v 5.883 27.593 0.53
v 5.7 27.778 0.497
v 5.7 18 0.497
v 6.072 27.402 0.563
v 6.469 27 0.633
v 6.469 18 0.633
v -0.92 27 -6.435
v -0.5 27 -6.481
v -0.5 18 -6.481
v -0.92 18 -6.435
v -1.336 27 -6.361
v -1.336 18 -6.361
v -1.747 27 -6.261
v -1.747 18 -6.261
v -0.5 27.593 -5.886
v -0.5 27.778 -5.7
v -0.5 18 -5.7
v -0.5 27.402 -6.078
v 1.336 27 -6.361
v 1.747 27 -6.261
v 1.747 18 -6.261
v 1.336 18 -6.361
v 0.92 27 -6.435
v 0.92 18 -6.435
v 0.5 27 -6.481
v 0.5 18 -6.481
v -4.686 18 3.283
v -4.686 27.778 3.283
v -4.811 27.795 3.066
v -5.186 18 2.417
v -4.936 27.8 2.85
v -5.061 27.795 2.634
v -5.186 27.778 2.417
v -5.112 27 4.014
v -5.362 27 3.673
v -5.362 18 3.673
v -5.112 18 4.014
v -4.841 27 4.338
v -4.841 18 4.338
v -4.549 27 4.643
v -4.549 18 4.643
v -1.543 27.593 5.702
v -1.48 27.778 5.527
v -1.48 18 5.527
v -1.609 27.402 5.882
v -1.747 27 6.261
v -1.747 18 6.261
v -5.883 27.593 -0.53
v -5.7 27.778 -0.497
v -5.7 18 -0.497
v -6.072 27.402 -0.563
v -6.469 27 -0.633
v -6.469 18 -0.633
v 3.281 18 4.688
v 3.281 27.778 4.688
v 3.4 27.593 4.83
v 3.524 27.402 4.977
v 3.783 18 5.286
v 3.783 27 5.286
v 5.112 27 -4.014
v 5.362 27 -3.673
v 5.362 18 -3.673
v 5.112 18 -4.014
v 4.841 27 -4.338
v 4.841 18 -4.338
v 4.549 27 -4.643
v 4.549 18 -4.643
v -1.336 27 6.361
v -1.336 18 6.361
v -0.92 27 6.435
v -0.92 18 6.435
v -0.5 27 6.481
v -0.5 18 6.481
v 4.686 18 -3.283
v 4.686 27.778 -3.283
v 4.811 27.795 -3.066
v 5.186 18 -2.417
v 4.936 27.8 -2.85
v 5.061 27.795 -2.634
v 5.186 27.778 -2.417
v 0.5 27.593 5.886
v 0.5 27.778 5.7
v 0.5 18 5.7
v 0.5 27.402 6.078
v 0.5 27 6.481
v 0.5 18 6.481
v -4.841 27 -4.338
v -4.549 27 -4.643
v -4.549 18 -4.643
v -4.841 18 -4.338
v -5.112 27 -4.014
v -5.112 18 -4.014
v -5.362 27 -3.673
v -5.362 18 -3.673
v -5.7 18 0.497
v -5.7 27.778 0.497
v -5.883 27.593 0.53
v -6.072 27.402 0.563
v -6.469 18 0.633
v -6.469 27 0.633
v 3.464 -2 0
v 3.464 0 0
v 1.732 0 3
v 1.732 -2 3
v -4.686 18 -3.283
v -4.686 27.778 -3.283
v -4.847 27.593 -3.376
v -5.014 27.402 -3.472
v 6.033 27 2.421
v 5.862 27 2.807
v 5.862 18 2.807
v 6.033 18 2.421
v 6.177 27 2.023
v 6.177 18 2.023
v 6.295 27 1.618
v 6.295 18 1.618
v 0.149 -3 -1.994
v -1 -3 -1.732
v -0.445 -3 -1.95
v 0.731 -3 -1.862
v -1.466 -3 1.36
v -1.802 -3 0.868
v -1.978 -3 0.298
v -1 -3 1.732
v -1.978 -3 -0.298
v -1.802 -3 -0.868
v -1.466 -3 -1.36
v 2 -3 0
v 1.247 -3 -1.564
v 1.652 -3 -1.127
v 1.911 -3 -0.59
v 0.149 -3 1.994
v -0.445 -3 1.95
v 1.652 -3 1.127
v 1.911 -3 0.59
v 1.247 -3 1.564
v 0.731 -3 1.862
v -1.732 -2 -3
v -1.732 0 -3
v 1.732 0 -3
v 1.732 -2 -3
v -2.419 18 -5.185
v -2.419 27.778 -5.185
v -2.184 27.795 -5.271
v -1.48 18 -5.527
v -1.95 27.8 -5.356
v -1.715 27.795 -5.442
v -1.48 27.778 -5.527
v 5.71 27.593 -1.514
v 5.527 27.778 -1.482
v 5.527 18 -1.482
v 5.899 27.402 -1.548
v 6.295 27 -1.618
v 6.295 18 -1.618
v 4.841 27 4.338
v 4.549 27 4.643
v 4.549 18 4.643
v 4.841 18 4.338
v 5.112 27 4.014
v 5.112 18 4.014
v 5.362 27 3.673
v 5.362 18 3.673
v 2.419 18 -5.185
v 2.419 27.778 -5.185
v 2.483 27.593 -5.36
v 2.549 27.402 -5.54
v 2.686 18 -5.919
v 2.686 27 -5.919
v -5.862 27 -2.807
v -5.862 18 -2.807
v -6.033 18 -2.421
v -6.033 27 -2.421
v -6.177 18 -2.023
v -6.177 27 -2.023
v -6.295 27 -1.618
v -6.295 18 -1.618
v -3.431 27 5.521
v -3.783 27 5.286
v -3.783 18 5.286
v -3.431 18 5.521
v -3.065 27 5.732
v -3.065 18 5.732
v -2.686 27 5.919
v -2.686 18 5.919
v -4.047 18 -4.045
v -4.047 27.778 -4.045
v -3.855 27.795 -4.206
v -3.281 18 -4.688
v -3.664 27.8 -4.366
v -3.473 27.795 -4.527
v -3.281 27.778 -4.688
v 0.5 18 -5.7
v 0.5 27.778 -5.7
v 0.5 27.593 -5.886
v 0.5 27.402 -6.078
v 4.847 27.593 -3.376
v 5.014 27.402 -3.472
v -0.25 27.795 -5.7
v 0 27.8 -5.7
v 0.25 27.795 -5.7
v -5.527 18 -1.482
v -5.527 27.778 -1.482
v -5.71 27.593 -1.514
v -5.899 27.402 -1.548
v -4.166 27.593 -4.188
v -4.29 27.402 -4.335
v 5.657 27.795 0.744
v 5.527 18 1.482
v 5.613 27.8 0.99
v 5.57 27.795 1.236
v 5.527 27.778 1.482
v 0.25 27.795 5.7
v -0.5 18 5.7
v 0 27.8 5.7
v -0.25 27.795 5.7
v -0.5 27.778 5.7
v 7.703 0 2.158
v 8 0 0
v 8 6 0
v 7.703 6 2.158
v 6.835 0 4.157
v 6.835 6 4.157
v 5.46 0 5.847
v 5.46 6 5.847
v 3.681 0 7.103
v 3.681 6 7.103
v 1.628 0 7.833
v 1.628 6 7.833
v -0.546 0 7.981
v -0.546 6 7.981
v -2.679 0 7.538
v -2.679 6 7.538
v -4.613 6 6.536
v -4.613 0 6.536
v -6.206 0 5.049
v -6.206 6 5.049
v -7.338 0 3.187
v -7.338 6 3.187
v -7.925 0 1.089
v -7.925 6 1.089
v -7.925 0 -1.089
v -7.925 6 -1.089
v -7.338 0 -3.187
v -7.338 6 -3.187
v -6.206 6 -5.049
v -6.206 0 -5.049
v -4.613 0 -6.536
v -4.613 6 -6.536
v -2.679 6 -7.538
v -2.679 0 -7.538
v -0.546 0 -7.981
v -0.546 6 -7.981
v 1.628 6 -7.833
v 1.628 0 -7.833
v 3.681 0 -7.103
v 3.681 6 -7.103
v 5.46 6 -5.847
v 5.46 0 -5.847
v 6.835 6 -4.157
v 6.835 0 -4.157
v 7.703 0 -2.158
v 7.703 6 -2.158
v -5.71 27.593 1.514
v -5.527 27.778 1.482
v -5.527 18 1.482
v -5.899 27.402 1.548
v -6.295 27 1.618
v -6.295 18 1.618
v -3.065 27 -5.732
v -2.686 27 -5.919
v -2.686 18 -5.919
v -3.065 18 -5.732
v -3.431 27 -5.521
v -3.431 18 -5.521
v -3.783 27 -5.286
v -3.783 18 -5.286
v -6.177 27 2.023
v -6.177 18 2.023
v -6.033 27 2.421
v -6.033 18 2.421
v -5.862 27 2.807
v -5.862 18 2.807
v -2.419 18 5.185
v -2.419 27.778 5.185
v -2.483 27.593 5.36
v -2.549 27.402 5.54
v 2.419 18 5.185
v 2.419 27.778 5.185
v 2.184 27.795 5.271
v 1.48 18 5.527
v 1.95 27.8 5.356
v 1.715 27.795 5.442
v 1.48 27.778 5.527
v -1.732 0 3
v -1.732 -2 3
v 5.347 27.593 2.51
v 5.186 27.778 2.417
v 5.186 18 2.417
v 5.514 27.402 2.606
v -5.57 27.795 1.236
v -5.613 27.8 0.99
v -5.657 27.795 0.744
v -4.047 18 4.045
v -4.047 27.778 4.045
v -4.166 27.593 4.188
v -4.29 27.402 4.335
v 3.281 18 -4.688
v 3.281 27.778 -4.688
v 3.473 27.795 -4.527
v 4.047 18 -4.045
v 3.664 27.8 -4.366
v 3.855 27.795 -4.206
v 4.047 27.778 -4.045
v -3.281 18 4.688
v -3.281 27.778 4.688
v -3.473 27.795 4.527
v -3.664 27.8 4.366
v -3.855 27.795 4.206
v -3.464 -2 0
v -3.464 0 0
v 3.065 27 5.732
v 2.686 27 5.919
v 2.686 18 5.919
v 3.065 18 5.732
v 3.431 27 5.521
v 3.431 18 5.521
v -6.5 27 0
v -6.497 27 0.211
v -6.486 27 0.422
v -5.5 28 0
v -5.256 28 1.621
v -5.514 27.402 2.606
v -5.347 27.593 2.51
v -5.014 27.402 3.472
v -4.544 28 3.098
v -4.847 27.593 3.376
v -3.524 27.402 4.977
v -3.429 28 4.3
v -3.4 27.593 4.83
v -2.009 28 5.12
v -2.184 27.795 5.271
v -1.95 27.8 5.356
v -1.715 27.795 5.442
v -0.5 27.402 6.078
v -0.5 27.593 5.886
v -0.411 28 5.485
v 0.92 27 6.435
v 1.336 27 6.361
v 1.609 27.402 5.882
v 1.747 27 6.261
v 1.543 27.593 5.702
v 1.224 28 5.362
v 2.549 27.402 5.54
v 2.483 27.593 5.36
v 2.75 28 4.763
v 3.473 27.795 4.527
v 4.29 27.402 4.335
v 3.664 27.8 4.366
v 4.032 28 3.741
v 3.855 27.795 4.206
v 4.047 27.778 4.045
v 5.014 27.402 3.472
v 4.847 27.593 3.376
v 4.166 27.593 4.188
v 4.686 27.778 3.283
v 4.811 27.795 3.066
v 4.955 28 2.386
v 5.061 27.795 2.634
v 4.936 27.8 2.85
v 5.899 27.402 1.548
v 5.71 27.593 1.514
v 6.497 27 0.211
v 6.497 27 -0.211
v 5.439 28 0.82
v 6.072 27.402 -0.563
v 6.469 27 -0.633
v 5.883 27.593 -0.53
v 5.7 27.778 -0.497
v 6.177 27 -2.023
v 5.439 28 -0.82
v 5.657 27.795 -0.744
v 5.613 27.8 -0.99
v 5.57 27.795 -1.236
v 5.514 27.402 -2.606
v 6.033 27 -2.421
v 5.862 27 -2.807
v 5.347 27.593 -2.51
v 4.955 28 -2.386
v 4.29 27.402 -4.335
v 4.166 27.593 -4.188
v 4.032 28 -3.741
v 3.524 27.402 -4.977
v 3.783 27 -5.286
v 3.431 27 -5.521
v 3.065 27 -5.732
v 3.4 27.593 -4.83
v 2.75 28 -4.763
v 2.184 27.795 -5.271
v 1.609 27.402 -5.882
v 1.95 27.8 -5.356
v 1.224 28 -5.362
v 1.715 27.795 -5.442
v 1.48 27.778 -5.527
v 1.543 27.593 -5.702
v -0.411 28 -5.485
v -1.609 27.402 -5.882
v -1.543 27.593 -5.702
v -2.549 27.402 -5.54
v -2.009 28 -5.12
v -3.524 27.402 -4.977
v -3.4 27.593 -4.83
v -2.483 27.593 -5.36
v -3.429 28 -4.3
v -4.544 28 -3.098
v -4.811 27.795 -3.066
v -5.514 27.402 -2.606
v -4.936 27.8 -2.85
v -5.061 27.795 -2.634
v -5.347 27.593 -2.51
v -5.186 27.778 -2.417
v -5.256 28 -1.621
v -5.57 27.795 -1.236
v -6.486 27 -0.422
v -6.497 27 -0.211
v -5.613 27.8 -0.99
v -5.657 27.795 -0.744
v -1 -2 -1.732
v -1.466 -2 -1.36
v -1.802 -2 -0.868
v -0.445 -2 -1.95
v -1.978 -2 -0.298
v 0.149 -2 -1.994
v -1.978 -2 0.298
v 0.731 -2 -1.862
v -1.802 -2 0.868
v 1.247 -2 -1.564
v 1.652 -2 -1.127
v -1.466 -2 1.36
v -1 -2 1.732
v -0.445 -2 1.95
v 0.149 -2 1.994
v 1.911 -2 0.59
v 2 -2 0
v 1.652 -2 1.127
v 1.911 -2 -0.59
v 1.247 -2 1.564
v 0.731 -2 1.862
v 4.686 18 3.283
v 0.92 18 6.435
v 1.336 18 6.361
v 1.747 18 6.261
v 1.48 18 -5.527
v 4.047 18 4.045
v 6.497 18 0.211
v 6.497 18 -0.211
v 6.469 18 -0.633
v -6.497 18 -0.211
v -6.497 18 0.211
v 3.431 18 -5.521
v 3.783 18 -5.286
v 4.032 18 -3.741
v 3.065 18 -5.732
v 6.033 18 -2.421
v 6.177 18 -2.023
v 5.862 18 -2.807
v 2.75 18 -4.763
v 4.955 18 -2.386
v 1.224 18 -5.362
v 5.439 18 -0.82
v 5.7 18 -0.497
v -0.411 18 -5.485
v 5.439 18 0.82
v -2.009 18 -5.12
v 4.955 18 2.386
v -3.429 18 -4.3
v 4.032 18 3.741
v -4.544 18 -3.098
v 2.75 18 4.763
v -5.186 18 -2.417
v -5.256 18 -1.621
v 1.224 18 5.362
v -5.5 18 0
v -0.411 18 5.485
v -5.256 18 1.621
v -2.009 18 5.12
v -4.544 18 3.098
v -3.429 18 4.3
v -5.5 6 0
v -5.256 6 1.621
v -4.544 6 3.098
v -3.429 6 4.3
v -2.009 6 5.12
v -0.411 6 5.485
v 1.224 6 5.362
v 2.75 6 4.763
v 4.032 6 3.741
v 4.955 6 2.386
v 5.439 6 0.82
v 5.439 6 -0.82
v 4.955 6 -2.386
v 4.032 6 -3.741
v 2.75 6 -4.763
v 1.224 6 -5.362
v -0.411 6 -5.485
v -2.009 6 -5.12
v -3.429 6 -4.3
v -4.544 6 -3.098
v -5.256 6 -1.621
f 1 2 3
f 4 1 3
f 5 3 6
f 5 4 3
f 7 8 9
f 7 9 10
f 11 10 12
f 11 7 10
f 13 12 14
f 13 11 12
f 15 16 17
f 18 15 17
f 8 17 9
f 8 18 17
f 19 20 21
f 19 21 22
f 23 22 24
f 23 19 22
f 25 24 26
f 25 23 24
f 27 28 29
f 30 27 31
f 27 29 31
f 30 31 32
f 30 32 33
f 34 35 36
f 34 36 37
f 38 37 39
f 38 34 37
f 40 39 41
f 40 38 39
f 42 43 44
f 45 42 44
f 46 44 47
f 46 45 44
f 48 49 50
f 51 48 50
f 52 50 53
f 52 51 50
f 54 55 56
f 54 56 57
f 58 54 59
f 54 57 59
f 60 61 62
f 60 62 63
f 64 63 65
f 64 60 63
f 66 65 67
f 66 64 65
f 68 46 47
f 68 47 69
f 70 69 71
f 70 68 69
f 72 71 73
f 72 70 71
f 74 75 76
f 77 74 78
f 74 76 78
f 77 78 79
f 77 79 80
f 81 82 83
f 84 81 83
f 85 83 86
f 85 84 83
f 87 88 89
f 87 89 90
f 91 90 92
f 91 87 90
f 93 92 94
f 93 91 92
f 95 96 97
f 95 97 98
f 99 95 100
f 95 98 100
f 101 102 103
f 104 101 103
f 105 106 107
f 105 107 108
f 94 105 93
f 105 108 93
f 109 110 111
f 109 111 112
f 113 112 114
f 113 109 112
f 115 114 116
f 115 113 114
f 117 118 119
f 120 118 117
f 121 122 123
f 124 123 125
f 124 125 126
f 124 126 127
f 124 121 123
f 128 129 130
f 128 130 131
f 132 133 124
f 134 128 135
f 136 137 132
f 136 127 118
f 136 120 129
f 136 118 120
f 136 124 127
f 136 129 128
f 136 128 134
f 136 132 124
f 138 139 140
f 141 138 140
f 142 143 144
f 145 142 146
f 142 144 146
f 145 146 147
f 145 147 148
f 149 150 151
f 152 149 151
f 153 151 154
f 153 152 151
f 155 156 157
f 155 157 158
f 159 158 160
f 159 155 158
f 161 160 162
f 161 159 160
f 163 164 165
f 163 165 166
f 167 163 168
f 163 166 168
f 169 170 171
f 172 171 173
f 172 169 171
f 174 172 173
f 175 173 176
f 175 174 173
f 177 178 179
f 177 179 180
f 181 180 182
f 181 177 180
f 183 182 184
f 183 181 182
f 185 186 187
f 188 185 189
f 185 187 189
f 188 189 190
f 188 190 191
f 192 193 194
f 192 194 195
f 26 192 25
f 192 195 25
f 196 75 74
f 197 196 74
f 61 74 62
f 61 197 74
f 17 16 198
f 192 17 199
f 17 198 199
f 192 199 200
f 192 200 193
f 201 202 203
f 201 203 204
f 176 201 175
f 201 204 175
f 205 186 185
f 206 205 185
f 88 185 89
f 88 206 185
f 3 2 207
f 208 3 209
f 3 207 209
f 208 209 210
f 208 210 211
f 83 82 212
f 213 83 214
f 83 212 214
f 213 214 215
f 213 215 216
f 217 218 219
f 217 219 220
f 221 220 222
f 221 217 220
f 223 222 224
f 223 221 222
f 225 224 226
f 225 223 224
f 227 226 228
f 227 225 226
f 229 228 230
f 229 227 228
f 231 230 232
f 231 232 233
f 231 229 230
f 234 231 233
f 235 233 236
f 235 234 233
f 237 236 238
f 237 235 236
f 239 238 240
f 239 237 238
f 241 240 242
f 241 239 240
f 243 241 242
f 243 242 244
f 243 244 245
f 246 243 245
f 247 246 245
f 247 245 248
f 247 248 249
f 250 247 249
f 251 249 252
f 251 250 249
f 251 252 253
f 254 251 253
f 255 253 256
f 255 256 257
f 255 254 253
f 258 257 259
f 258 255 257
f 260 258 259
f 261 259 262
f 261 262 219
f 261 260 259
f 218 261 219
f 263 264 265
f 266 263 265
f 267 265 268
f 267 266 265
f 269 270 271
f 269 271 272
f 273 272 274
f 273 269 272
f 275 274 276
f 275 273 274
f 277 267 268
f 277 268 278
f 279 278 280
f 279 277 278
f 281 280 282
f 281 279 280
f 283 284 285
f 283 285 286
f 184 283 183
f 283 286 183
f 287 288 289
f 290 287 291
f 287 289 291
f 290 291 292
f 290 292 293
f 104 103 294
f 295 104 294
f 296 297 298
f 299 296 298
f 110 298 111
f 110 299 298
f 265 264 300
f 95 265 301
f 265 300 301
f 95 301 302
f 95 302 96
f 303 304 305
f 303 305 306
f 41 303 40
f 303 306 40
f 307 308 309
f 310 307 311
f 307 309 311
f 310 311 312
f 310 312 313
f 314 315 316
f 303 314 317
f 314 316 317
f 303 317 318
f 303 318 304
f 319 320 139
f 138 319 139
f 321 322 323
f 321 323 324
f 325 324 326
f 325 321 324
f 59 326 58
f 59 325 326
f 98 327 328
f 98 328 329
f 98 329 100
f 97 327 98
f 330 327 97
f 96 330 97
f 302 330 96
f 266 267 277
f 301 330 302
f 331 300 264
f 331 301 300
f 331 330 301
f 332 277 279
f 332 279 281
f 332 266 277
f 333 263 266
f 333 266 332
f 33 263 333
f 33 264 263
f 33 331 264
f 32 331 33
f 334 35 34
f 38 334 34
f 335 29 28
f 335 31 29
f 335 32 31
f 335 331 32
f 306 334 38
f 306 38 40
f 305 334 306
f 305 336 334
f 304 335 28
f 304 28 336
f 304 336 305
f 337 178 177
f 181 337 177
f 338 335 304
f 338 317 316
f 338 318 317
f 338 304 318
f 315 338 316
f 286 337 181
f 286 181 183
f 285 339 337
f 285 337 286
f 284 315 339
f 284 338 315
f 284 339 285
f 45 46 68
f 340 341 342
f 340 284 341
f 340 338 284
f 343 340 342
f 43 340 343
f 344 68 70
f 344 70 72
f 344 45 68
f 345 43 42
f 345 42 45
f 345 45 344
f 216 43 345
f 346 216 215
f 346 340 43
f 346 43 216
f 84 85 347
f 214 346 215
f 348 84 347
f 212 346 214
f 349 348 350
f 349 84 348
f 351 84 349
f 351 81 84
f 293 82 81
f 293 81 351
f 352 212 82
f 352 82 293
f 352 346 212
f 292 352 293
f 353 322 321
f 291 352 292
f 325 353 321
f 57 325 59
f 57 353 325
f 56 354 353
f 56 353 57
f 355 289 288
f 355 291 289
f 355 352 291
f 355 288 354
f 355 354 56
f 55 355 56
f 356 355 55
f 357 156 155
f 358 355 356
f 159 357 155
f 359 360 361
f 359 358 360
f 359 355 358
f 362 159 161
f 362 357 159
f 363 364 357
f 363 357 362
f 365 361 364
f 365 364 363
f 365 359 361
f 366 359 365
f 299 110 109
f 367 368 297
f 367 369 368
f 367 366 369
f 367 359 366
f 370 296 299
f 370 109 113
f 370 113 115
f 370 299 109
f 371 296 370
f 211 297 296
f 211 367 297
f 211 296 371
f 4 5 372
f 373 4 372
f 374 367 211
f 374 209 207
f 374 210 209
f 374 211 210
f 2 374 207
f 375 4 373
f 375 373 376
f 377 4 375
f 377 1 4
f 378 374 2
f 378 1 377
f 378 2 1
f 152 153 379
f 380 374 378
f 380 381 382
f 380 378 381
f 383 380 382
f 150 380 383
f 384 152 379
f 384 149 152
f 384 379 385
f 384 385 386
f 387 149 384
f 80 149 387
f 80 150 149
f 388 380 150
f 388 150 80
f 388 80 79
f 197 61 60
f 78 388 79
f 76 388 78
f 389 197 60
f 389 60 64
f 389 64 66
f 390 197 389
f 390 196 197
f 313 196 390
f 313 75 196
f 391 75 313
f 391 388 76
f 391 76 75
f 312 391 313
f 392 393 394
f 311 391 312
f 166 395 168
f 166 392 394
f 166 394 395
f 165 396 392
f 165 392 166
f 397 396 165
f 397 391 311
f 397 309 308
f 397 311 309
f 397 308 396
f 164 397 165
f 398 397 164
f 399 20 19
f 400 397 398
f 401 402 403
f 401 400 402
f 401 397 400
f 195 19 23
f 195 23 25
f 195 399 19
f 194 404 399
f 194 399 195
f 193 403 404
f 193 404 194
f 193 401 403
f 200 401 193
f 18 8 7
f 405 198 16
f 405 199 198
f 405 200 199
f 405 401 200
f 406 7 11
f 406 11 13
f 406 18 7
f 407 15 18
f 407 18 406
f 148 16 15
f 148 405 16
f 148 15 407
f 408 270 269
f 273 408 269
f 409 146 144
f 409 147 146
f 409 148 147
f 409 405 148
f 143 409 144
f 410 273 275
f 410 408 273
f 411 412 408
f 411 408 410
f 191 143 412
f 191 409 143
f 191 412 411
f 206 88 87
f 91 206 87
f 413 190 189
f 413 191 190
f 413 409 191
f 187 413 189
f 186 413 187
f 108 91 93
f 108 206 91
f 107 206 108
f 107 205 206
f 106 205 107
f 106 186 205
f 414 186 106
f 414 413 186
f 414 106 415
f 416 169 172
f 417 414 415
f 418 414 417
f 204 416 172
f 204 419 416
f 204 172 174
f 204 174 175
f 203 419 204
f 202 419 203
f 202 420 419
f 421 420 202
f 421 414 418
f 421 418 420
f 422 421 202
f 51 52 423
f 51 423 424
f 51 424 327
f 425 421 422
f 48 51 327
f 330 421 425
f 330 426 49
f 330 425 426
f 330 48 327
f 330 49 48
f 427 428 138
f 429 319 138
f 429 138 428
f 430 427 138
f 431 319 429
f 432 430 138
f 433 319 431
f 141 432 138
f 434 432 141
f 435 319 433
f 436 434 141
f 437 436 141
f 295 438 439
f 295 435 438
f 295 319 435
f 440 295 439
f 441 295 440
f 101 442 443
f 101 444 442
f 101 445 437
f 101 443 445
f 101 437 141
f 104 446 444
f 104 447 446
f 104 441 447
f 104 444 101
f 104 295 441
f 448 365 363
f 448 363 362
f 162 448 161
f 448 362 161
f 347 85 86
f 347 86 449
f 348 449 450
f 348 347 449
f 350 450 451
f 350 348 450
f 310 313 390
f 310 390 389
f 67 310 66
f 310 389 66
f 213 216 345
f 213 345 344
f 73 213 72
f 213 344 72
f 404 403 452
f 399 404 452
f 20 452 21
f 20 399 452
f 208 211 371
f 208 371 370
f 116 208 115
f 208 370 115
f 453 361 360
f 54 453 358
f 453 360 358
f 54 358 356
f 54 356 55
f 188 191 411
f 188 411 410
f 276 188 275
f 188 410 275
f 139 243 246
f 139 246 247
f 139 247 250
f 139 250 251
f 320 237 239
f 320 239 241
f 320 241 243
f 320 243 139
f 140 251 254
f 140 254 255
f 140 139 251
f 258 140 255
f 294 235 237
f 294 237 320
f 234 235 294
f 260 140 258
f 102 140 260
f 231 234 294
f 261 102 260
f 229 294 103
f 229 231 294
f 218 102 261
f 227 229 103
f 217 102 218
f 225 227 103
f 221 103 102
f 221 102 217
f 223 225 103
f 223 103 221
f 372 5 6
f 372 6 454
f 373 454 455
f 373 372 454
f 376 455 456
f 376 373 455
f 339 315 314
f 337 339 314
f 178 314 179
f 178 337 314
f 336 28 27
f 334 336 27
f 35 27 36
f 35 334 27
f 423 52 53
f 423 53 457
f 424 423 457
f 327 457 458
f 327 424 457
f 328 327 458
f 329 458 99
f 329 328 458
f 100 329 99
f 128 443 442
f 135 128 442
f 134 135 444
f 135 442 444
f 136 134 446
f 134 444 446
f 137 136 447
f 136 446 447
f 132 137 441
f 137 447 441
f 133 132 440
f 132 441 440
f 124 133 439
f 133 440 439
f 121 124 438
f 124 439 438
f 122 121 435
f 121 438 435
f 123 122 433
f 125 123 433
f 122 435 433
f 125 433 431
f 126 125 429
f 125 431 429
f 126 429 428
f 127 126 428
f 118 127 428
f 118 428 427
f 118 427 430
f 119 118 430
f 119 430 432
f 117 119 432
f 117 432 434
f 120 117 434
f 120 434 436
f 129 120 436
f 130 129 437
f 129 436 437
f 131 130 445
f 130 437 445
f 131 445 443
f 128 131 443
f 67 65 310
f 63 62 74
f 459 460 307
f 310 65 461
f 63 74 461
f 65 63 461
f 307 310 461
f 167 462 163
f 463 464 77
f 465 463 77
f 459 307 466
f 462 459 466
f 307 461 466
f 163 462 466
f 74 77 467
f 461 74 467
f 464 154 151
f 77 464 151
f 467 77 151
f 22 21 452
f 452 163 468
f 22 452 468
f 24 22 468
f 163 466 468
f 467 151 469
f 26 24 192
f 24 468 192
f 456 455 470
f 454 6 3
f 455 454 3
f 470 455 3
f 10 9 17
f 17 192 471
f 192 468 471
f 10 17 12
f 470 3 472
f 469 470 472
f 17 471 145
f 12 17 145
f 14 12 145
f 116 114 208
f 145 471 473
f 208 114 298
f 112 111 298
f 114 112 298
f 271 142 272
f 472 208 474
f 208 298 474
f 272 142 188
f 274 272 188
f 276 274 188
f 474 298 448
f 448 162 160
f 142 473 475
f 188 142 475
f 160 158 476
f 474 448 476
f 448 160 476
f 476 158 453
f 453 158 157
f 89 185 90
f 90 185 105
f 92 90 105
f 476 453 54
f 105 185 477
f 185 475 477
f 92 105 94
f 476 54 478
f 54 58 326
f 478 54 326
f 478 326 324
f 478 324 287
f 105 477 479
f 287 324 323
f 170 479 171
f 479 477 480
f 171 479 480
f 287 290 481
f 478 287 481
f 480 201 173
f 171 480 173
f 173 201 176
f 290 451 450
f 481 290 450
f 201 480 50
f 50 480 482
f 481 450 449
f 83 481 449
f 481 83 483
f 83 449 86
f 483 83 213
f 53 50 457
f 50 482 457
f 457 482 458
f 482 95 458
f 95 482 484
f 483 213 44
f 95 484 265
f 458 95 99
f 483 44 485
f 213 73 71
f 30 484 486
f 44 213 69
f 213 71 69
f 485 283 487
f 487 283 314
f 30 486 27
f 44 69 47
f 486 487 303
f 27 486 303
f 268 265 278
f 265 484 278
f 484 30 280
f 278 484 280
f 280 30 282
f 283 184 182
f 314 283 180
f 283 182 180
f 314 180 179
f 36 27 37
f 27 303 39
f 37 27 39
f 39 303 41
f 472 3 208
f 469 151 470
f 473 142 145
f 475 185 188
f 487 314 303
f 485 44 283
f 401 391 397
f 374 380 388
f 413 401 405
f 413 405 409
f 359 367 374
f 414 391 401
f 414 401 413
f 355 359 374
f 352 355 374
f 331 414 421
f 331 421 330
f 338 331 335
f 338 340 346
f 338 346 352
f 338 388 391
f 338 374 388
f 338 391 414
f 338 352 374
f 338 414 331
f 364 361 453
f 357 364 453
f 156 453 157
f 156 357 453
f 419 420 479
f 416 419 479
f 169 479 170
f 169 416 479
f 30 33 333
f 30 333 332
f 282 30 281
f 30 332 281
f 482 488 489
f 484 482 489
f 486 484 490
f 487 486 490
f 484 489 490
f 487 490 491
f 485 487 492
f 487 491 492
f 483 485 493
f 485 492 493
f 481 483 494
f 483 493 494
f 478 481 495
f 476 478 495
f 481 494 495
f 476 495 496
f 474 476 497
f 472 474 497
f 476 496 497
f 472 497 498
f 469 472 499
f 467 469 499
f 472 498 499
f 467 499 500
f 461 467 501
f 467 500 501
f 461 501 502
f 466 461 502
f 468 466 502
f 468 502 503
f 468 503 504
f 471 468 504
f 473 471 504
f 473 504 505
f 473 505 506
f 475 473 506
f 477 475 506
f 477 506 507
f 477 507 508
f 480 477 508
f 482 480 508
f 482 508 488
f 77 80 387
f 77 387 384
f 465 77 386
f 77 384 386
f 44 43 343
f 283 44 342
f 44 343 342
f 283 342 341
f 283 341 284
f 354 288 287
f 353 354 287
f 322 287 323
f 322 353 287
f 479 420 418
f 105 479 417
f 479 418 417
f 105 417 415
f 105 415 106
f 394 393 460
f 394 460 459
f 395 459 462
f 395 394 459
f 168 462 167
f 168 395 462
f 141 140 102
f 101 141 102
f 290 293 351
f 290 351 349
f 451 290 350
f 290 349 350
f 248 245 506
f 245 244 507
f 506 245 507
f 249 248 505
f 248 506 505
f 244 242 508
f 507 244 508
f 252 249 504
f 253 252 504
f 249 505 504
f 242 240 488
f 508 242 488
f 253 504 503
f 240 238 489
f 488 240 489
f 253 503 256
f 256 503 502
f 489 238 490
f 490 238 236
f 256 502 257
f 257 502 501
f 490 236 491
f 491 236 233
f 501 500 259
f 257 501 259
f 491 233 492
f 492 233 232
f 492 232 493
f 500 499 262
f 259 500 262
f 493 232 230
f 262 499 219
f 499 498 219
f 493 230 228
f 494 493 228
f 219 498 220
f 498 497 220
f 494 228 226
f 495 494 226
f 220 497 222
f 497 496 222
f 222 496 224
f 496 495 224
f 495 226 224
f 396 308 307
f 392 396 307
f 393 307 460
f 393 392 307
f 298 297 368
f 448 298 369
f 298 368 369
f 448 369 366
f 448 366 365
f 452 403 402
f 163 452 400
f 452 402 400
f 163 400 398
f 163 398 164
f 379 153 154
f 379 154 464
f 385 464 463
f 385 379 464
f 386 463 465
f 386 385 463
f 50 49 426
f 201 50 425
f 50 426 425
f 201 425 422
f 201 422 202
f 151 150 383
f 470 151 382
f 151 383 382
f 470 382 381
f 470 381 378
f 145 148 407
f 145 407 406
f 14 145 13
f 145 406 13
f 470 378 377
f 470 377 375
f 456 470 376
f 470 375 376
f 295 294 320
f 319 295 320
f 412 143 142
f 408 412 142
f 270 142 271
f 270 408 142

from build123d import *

# Parameters (mm, degrees)
F0_R             = 8
F1_DEPTH         = 6
F3_DEPTH         = 2
F4_R             = 2
F5_DEPTH         = 1
F6_R             = 5.5
F7_DEPTH         = 22
F8_R             = 6.5
F8_R_2           = 5.5
F9_DEPTH         = 10
F10_SIZE         = 1
F11_W            = 1
F11_H            = 2
F12_DEPTH        = 20
F12_COPIES_COUNT = 18


# Not quite as in the source:
# - a pattern or mirror of a feature is missing from the dataset's text; its kind, count and spacing are read off the source's solid


with BuildPart() as f1:
    # F0 (on Front) → F1 (new body)
    with BuildSketch(Plane.XZ):
        Circle(F0_R)
    extrude(amount=-F1_DEPTH)

    # F2 (on face) → F3 (join)
    with BuildSketch(Plane.XZ):
        Polygon((1.7320508076, -3), (3.4641016151, 0), (1.7320508076, 3), (-1.7320508076, 3), (-3.4641016151, 0), (-1.7320508076, -3), align=None)
    extrude(amount=F3_DEPTH)

    # F4 (on face) → F5 (join)
    with BuildSketch(Plane.XZ.offset(2)):
        Circle(F4_R)
    extrude(amount=F5_DEPTH)

    # F6 (on face) → F7 (join)
    with BuildSketch(Plane(origin=(0, 6, 0), x_dir=(-1, 0, 0), z_dir=(0, 1, 0))):
        Circle(F6_R)
    extrude(amount=F7_DEPTH)

    # F8 (on face) → F9 (join)
    with BuildSketch(Plane(origin=(0, 28, 0), x_dir=(-1, 0, 0), z_dir=(0, 1, 0))):
        Circle(F8_R)
        Circle(F8_R_2, mode=Mode.SUBTRACT)
    extrude(amount=-F9_DEPTH)

    # F10
    f10_edges = [f1.edges().sort_by_distance(p)[0] for p in [
        (6.5, 28, 0),
    ]]
    chamfer(f10_edges, length=F10_SIZE)

    # F11 (on face) → F12 (cut)
    with BuildSketch(Plane(origin=(0, 28, 0), x_dir=(-1, 0, 0), z_dir=(0, 1, 0))):
        with Locations((0, 6.7)):
            Rectangle(F11_W, F11_H)
    f12 = extrude(amount=-F12_DEPTH, mode=Mode.SUBTRACT)

    # F12_copies: F12 ×18 about axis
    f12_copies_axis = Axis((0, 0, 0), (0, 1, 0))
    for i in range(1, F12_COPIES_COUNT):
        add(f12.rotate(f12_copies_axis, i * 360 / F12_COPIES_COUNT), mode=Mode.SUBTRACT)


solid = f1.part
